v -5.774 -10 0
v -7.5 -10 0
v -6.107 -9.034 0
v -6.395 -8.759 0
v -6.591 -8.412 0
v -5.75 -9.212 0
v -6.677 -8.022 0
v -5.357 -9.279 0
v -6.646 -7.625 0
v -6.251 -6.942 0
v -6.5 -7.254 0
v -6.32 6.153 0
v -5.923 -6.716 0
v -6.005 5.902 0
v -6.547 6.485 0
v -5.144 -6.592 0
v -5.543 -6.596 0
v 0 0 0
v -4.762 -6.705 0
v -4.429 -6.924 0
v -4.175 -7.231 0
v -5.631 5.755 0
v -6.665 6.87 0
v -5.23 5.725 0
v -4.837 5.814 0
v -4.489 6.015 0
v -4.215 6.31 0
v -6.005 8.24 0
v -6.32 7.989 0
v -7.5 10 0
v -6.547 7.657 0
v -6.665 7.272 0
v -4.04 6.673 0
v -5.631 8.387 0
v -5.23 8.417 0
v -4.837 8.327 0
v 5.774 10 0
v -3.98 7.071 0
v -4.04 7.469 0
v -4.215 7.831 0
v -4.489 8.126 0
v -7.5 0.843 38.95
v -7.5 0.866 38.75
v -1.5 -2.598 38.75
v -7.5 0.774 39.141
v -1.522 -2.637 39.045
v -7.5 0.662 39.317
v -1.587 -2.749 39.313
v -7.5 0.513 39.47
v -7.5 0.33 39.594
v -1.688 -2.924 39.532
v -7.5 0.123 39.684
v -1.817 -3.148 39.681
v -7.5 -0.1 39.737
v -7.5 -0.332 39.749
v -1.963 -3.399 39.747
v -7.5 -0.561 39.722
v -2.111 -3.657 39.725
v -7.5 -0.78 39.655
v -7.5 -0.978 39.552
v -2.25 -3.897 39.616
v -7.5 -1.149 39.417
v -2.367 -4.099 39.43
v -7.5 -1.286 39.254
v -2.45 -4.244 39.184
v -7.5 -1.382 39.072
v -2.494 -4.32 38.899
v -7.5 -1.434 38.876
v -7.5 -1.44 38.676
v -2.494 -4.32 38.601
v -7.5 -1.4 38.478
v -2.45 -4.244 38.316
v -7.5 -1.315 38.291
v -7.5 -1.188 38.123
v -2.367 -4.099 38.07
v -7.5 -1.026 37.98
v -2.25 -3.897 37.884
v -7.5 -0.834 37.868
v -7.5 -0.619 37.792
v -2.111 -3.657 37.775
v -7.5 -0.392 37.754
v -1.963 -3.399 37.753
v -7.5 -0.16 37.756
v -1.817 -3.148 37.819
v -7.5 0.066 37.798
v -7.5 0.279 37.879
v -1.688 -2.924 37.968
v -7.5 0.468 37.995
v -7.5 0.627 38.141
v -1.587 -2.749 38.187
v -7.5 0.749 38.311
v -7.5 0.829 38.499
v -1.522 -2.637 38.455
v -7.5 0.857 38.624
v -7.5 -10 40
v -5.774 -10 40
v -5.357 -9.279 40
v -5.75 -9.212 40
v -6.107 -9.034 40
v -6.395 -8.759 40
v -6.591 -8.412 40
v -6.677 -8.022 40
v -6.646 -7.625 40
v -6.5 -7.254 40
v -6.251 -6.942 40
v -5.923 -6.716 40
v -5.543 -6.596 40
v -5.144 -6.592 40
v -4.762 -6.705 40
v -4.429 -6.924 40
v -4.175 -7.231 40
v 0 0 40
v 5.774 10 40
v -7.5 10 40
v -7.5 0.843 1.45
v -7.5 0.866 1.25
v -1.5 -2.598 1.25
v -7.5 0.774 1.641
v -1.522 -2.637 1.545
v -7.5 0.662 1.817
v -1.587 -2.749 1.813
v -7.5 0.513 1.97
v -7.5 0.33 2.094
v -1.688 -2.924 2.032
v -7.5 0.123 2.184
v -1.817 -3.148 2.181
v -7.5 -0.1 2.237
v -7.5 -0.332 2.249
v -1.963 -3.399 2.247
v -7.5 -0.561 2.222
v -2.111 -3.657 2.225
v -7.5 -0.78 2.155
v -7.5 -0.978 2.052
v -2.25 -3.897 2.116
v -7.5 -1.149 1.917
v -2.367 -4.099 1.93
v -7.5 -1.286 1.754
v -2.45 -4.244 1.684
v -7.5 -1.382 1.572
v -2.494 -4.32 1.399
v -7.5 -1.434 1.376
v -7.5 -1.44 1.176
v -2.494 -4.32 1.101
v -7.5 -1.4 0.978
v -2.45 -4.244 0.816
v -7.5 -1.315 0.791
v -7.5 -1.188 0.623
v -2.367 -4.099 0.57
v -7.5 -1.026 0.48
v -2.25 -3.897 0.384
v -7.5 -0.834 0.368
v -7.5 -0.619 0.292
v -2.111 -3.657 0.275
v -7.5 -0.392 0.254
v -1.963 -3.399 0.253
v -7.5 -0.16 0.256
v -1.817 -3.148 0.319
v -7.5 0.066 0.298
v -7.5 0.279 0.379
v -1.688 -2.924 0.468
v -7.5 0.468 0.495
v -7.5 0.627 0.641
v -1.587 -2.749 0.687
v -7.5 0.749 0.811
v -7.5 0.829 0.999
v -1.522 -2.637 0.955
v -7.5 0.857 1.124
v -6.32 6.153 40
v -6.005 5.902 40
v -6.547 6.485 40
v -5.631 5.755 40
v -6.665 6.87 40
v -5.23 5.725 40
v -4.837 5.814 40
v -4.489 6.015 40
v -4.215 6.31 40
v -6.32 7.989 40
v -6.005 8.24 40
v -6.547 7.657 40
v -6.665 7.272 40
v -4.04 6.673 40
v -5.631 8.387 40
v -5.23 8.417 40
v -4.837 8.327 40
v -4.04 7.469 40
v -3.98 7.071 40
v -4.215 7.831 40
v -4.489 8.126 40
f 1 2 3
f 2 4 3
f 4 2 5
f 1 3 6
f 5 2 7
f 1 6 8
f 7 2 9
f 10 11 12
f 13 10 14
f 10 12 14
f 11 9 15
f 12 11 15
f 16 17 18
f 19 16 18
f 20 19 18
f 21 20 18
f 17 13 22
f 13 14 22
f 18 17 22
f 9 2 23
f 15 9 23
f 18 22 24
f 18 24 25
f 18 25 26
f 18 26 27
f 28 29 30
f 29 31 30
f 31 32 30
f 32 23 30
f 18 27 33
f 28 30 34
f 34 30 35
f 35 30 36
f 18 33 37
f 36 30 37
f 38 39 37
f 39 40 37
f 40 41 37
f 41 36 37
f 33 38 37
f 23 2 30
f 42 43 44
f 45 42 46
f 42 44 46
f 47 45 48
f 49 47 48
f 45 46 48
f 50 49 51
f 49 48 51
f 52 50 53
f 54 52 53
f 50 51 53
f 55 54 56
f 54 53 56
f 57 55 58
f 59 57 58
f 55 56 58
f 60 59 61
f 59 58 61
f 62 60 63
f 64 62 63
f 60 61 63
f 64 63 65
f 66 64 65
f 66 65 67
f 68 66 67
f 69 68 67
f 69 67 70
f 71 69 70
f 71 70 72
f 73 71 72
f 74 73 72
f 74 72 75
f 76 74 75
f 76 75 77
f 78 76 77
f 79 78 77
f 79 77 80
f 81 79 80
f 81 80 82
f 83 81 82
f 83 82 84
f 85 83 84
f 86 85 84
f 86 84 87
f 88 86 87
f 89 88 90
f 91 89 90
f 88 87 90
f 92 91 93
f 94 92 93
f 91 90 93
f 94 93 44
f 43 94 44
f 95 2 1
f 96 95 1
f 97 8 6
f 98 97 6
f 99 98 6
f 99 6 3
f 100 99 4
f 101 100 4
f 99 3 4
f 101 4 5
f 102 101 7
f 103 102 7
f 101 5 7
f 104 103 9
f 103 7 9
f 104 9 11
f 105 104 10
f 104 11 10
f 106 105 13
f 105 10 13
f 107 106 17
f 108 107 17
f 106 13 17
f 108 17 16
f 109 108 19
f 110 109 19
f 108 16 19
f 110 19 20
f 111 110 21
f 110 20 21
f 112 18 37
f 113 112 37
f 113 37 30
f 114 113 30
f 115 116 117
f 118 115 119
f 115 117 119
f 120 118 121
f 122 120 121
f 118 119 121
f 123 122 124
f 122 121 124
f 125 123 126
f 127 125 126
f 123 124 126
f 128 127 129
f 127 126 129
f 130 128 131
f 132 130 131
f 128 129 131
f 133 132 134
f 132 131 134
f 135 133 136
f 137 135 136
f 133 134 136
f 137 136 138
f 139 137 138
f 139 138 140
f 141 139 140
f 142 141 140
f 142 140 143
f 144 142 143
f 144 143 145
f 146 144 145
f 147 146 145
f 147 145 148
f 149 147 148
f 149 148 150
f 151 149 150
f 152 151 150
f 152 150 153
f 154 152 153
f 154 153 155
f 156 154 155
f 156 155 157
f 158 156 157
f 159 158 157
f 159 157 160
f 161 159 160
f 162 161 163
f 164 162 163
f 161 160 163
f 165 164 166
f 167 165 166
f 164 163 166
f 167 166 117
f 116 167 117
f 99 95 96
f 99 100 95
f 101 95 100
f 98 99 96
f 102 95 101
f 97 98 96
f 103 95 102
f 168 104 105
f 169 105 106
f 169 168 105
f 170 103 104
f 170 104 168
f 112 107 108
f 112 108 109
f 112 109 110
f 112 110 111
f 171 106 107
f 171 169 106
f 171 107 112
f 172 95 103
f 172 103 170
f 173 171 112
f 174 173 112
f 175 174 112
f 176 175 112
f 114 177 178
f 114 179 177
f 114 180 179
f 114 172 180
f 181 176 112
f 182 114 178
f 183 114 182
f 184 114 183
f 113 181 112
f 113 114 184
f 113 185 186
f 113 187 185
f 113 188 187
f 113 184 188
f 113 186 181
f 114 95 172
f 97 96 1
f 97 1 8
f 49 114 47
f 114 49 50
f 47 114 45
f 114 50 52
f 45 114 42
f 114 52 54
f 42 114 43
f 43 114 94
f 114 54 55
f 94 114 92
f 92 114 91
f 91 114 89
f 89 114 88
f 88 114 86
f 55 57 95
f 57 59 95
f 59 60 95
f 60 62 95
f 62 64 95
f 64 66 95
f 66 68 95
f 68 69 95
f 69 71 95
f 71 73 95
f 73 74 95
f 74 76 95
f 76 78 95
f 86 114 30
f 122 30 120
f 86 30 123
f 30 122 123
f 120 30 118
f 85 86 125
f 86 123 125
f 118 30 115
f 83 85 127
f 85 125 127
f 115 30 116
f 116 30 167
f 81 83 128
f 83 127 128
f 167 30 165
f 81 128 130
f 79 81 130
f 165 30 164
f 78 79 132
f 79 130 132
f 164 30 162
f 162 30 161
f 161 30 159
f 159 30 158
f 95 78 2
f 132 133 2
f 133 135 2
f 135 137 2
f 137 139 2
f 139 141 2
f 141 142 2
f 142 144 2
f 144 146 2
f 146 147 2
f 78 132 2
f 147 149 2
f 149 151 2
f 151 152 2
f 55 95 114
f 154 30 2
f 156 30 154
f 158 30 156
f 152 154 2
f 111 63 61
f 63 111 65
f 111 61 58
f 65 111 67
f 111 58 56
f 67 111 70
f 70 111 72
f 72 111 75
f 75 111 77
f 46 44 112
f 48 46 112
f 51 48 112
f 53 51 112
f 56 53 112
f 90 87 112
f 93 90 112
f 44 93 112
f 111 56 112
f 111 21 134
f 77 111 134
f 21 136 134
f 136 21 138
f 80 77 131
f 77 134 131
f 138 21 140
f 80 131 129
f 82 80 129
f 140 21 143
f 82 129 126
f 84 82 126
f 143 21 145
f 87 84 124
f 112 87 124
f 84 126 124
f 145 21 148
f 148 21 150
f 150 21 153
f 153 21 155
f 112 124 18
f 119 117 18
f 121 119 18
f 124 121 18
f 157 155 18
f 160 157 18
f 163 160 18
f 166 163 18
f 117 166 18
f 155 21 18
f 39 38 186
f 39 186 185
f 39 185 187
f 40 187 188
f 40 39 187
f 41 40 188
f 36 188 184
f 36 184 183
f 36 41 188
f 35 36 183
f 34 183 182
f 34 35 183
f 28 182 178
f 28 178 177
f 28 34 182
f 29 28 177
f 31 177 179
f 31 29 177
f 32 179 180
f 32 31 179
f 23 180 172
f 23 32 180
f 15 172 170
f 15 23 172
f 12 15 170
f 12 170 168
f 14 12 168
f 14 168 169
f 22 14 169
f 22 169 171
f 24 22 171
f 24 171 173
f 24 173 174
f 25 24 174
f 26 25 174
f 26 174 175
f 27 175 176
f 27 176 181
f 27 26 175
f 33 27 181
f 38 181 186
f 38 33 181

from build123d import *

# Parameters (mm, degrees)
SKETCH_1_R          = 1.35
EXTRUDE_1_DEPTH     = 40
SKETCH_2_R          = 1
CUT_EXTRUDE_1_DEPTH = 40


with BuildPart() as part:
    # 草图1 → 凸台-拉伸1 (new body)
    with BuildSketch(Plane.XY):
        with BuildLine():
            Line((0, 0), (5.773502692, 10))
            Line((5.773502692, 10), (-7.5, 10))
            Line((-7.5, 10), (-7.5, -10))
            Line((-7.5, -10), (-5.773502692, -10))
            Line((-5.773502692, -10), (-5.357205868, -9.278952749))
            ThreePointArc((-5.357205868, -9.278952749), (-6.499558695, -7.254218423), (-4.174910918, -7.231157828))
            Line((-4.174910918, -7.231157828), (0, 0))
        make_face()
        with Locations((-5.3304244, 7.070781577)):
            Circle(SKETCH_1_R, mode=Mode.SUBTRACT)
    extrude(amount=EXTRUDE_1_DEPTH)

    # 草图2 → 切除-拉伸1 (cut)
    with BuildSketch(Plane(origin=(0, 0, 0), x_dir=(0, 0, -1), z_dir=(0.8660254037844399, -0.4999999999999977, 0))):
        with Locations(Location((-1.25, -4, 0), (0, 0, 90))):
            Circle(SKETCH_2_R)
        with Locations(Location((-38.75, -4, 0), (0, 0, 90))):
            Circle(SKETCH_2_R)
    extrude(amount=-CUT_EXTRUDE_1_DEPTH, mode=Mode.SUBTRACT)


solid = part.part
